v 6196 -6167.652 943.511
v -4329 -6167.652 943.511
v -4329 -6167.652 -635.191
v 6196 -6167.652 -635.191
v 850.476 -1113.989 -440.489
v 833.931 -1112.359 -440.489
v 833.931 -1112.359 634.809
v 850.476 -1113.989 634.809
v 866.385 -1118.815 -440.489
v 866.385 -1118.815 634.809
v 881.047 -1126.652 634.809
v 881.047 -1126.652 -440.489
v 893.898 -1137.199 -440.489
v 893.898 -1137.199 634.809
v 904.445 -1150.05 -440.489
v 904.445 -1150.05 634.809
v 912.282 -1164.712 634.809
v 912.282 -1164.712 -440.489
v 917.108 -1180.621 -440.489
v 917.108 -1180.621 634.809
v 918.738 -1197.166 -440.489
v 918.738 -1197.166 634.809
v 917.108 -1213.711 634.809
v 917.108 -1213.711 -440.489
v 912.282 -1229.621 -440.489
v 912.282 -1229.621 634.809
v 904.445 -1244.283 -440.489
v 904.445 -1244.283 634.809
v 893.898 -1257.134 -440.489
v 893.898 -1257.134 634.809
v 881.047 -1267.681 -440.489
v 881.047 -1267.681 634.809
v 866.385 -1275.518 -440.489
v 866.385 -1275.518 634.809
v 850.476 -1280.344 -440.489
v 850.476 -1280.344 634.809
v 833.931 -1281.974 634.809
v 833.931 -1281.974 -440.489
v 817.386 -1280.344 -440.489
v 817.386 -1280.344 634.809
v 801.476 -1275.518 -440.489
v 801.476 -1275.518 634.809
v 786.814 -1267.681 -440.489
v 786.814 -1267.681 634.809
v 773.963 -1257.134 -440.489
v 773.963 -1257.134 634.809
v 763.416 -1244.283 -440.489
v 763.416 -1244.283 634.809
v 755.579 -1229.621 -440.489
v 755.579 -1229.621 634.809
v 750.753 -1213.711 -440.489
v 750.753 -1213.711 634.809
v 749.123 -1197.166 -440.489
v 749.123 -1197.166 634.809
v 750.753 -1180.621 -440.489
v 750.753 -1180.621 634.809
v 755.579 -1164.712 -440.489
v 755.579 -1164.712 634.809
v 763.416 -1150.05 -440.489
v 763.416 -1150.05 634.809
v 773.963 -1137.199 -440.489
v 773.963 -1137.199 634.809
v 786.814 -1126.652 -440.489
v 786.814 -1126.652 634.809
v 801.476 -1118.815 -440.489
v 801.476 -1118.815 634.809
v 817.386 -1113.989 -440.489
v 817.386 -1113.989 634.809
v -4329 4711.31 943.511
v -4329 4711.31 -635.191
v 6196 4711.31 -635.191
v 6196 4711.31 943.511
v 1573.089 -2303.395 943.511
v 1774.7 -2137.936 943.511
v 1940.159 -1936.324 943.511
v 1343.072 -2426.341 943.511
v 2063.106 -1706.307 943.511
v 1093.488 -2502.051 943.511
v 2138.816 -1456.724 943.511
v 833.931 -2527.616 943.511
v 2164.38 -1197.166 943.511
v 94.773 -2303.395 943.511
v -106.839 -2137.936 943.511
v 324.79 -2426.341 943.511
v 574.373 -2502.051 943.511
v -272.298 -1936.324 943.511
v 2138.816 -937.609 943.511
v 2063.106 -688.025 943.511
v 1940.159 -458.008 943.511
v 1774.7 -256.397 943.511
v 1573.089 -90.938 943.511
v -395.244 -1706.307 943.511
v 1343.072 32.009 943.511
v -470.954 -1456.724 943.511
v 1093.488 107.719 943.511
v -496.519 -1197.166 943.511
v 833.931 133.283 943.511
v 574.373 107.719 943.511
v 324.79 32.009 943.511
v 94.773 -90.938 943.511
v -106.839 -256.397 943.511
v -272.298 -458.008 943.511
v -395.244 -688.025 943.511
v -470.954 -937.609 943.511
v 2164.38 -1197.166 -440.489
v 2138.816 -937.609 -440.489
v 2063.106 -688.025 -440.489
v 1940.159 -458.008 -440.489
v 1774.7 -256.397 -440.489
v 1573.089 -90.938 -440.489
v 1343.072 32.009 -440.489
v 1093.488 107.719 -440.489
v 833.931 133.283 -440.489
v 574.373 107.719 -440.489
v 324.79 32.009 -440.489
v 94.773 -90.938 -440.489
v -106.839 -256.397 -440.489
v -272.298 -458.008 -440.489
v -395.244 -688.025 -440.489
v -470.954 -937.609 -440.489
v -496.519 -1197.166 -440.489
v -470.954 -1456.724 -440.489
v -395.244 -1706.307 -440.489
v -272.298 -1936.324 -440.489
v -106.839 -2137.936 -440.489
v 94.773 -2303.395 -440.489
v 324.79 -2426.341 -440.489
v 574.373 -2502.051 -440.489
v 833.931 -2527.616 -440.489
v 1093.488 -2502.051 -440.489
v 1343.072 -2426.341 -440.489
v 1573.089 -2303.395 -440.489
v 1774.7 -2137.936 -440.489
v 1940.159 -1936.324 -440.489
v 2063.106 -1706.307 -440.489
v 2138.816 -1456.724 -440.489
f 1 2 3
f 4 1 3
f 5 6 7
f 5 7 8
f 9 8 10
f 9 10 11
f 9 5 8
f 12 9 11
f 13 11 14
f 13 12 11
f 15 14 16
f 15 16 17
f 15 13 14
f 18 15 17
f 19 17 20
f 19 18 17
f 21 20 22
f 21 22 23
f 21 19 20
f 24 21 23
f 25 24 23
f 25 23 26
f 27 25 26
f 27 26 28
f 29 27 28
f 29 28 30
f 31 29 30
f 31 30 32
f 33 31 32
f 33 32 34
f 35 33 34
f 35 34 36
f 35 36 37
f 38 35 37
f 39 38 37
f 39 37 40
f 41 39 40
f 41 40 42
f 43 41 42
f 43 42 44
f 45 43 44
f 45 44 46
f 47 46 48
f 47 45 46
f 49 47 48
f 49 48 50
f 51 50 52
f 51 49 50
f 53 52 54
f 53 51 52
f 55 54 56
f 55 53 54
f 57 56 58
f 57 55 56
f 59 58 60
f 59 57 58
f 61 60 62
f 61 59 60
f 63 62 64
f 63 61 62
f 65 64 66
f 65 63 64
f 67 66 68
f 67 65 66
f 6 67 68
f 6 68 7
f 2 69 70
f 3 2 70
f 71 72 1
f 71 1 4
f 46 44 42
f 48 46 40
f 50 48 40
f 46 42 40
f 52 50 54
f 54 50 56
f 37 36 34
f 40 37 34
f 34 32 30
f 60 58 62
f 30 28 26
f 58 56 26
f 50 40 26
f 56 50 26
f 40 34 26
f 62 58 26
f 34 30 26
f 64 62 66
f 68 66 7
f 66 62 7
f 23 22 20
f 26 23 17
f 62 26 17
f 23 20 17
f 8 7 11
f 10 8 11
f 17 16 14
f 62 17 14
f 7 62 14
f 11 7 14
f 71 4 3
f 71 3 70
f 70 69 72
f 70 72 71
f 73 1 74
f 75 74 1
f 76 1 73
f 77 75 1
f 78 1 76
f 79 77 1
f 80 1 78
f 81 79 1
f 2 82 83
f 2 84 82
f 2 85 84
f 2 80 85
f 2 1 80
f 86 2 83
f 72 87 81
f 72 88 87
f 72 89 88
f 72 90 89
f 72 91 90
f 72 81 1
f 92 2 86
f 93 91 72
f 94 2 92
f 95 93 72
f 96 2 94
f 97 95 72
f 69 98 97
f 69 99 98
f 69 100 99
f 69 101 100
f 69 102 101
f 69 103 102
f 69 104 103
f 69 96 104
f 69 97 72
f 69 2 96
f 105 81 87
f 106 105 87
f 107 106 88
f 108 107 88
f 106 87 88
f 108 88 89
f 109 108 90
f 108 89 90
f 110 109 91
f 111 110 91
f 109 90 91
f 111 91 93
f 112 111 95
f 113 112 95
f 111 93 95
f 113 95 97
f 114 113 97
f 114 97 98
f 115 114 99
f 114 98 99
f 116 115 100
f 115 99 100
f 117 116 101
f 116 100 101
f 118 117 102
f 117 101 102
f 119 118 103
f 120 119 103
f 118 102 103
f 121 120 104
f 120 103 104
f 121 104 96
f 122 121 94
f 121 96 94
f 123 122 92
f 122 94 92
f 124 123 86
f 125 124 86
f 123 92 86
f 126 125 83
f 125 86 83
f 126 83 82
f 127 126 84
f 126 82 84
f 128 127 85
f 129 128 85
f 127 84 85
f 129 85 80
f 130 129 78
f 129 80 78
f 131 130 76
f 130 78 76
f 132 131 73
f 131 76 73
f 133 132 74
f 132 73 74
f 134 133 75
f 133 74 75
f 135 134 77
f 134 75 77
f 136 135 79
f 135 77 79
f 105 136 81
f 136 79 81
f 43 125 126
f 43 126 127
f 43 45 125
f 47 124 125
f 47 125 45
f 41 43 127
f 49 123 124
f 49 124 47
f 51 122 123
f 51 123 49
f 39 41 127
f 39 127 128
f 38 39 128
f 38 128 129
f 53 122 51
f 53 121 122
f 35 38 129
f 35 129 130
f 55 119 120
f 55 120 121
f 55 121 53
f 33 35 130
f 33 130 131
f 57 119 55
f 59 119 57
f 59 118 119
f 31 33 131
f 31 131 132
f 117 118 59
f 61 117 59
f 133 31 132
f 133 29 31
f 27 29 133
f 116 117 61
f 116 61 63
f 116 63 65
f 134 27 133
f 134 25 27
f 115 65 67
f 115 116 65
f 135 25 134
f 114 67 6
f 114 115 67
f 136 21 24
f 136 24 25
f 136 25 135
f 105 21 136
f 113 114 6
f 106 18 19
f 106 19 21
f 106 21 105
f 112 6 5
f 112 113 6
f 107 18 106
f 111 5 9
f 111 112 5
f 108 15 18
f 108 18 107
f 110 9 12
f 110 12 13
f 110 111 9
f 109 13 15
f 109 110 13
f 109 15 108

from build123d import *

# Parameters (mm, degrees)
BOSS_EXTRUDE1_DEPTH      = 6196
BOSS_EXTRUDE1_DEPTH_BACK = 4329
SKETCH1_W                = 1578.701976668
SKETCH1_H                = 10878.961606317
SKETCH3_R                = 1330.449328347
CUT_EXTRUDE1_DEPTH       = 1384
SKETCH4_R                = 84.807211279
BOSS_EXTRUDE2_DEPTH      = 1270


with BuildPart() as part:
    # Sketch1 → Boss-Extrude1 (new, two sides: drawn at the far end of the back side and taken through both)
    with BuildSketch(Plane(origin=(0, 0, 0), x_dir=(0, 0, -1), z_dir=(1, 0, 0)).offset(-BOSS_EXTRUDE1_DEPTH_BACK)):
        with Locations((-154.159787834, -728.170853353)):
            Rectangle(SKETCH1_W, SKETCH1_H)
    extrude(amount=BOSS_EXTRUDE1_DEPTH + BOSS_EXTRUDE1_DEPTH_BACK)

    # Sketch3 → Cut-Extrude1 (cut)
    with BuildSketch(Plane.XY.offset(943.510776168)):
        with Locations((833.930631376, -1197.16637306)):
            Circle(SKETCH3_R)
    extrude(amount=-CUT_EXTRUDE1_DEPTH, mode=Mode.SUBTRACT)

    # Sketch4 → Boss-Extrude2 (add)
    with BuildSketch(Plane(origin=(0, 0, -635.1912005), x_dir=(-1, 0, 0), z_dir=(0, 0, -1))):
        with Locations(Location((-833.930631376, -1197.16637306, 0), (0, 0, 90))):
            Circle(SKETCH4_R)
    extrude(amount=-BOSS_EXTRUDE2_DEPTH)


solid = part.part
